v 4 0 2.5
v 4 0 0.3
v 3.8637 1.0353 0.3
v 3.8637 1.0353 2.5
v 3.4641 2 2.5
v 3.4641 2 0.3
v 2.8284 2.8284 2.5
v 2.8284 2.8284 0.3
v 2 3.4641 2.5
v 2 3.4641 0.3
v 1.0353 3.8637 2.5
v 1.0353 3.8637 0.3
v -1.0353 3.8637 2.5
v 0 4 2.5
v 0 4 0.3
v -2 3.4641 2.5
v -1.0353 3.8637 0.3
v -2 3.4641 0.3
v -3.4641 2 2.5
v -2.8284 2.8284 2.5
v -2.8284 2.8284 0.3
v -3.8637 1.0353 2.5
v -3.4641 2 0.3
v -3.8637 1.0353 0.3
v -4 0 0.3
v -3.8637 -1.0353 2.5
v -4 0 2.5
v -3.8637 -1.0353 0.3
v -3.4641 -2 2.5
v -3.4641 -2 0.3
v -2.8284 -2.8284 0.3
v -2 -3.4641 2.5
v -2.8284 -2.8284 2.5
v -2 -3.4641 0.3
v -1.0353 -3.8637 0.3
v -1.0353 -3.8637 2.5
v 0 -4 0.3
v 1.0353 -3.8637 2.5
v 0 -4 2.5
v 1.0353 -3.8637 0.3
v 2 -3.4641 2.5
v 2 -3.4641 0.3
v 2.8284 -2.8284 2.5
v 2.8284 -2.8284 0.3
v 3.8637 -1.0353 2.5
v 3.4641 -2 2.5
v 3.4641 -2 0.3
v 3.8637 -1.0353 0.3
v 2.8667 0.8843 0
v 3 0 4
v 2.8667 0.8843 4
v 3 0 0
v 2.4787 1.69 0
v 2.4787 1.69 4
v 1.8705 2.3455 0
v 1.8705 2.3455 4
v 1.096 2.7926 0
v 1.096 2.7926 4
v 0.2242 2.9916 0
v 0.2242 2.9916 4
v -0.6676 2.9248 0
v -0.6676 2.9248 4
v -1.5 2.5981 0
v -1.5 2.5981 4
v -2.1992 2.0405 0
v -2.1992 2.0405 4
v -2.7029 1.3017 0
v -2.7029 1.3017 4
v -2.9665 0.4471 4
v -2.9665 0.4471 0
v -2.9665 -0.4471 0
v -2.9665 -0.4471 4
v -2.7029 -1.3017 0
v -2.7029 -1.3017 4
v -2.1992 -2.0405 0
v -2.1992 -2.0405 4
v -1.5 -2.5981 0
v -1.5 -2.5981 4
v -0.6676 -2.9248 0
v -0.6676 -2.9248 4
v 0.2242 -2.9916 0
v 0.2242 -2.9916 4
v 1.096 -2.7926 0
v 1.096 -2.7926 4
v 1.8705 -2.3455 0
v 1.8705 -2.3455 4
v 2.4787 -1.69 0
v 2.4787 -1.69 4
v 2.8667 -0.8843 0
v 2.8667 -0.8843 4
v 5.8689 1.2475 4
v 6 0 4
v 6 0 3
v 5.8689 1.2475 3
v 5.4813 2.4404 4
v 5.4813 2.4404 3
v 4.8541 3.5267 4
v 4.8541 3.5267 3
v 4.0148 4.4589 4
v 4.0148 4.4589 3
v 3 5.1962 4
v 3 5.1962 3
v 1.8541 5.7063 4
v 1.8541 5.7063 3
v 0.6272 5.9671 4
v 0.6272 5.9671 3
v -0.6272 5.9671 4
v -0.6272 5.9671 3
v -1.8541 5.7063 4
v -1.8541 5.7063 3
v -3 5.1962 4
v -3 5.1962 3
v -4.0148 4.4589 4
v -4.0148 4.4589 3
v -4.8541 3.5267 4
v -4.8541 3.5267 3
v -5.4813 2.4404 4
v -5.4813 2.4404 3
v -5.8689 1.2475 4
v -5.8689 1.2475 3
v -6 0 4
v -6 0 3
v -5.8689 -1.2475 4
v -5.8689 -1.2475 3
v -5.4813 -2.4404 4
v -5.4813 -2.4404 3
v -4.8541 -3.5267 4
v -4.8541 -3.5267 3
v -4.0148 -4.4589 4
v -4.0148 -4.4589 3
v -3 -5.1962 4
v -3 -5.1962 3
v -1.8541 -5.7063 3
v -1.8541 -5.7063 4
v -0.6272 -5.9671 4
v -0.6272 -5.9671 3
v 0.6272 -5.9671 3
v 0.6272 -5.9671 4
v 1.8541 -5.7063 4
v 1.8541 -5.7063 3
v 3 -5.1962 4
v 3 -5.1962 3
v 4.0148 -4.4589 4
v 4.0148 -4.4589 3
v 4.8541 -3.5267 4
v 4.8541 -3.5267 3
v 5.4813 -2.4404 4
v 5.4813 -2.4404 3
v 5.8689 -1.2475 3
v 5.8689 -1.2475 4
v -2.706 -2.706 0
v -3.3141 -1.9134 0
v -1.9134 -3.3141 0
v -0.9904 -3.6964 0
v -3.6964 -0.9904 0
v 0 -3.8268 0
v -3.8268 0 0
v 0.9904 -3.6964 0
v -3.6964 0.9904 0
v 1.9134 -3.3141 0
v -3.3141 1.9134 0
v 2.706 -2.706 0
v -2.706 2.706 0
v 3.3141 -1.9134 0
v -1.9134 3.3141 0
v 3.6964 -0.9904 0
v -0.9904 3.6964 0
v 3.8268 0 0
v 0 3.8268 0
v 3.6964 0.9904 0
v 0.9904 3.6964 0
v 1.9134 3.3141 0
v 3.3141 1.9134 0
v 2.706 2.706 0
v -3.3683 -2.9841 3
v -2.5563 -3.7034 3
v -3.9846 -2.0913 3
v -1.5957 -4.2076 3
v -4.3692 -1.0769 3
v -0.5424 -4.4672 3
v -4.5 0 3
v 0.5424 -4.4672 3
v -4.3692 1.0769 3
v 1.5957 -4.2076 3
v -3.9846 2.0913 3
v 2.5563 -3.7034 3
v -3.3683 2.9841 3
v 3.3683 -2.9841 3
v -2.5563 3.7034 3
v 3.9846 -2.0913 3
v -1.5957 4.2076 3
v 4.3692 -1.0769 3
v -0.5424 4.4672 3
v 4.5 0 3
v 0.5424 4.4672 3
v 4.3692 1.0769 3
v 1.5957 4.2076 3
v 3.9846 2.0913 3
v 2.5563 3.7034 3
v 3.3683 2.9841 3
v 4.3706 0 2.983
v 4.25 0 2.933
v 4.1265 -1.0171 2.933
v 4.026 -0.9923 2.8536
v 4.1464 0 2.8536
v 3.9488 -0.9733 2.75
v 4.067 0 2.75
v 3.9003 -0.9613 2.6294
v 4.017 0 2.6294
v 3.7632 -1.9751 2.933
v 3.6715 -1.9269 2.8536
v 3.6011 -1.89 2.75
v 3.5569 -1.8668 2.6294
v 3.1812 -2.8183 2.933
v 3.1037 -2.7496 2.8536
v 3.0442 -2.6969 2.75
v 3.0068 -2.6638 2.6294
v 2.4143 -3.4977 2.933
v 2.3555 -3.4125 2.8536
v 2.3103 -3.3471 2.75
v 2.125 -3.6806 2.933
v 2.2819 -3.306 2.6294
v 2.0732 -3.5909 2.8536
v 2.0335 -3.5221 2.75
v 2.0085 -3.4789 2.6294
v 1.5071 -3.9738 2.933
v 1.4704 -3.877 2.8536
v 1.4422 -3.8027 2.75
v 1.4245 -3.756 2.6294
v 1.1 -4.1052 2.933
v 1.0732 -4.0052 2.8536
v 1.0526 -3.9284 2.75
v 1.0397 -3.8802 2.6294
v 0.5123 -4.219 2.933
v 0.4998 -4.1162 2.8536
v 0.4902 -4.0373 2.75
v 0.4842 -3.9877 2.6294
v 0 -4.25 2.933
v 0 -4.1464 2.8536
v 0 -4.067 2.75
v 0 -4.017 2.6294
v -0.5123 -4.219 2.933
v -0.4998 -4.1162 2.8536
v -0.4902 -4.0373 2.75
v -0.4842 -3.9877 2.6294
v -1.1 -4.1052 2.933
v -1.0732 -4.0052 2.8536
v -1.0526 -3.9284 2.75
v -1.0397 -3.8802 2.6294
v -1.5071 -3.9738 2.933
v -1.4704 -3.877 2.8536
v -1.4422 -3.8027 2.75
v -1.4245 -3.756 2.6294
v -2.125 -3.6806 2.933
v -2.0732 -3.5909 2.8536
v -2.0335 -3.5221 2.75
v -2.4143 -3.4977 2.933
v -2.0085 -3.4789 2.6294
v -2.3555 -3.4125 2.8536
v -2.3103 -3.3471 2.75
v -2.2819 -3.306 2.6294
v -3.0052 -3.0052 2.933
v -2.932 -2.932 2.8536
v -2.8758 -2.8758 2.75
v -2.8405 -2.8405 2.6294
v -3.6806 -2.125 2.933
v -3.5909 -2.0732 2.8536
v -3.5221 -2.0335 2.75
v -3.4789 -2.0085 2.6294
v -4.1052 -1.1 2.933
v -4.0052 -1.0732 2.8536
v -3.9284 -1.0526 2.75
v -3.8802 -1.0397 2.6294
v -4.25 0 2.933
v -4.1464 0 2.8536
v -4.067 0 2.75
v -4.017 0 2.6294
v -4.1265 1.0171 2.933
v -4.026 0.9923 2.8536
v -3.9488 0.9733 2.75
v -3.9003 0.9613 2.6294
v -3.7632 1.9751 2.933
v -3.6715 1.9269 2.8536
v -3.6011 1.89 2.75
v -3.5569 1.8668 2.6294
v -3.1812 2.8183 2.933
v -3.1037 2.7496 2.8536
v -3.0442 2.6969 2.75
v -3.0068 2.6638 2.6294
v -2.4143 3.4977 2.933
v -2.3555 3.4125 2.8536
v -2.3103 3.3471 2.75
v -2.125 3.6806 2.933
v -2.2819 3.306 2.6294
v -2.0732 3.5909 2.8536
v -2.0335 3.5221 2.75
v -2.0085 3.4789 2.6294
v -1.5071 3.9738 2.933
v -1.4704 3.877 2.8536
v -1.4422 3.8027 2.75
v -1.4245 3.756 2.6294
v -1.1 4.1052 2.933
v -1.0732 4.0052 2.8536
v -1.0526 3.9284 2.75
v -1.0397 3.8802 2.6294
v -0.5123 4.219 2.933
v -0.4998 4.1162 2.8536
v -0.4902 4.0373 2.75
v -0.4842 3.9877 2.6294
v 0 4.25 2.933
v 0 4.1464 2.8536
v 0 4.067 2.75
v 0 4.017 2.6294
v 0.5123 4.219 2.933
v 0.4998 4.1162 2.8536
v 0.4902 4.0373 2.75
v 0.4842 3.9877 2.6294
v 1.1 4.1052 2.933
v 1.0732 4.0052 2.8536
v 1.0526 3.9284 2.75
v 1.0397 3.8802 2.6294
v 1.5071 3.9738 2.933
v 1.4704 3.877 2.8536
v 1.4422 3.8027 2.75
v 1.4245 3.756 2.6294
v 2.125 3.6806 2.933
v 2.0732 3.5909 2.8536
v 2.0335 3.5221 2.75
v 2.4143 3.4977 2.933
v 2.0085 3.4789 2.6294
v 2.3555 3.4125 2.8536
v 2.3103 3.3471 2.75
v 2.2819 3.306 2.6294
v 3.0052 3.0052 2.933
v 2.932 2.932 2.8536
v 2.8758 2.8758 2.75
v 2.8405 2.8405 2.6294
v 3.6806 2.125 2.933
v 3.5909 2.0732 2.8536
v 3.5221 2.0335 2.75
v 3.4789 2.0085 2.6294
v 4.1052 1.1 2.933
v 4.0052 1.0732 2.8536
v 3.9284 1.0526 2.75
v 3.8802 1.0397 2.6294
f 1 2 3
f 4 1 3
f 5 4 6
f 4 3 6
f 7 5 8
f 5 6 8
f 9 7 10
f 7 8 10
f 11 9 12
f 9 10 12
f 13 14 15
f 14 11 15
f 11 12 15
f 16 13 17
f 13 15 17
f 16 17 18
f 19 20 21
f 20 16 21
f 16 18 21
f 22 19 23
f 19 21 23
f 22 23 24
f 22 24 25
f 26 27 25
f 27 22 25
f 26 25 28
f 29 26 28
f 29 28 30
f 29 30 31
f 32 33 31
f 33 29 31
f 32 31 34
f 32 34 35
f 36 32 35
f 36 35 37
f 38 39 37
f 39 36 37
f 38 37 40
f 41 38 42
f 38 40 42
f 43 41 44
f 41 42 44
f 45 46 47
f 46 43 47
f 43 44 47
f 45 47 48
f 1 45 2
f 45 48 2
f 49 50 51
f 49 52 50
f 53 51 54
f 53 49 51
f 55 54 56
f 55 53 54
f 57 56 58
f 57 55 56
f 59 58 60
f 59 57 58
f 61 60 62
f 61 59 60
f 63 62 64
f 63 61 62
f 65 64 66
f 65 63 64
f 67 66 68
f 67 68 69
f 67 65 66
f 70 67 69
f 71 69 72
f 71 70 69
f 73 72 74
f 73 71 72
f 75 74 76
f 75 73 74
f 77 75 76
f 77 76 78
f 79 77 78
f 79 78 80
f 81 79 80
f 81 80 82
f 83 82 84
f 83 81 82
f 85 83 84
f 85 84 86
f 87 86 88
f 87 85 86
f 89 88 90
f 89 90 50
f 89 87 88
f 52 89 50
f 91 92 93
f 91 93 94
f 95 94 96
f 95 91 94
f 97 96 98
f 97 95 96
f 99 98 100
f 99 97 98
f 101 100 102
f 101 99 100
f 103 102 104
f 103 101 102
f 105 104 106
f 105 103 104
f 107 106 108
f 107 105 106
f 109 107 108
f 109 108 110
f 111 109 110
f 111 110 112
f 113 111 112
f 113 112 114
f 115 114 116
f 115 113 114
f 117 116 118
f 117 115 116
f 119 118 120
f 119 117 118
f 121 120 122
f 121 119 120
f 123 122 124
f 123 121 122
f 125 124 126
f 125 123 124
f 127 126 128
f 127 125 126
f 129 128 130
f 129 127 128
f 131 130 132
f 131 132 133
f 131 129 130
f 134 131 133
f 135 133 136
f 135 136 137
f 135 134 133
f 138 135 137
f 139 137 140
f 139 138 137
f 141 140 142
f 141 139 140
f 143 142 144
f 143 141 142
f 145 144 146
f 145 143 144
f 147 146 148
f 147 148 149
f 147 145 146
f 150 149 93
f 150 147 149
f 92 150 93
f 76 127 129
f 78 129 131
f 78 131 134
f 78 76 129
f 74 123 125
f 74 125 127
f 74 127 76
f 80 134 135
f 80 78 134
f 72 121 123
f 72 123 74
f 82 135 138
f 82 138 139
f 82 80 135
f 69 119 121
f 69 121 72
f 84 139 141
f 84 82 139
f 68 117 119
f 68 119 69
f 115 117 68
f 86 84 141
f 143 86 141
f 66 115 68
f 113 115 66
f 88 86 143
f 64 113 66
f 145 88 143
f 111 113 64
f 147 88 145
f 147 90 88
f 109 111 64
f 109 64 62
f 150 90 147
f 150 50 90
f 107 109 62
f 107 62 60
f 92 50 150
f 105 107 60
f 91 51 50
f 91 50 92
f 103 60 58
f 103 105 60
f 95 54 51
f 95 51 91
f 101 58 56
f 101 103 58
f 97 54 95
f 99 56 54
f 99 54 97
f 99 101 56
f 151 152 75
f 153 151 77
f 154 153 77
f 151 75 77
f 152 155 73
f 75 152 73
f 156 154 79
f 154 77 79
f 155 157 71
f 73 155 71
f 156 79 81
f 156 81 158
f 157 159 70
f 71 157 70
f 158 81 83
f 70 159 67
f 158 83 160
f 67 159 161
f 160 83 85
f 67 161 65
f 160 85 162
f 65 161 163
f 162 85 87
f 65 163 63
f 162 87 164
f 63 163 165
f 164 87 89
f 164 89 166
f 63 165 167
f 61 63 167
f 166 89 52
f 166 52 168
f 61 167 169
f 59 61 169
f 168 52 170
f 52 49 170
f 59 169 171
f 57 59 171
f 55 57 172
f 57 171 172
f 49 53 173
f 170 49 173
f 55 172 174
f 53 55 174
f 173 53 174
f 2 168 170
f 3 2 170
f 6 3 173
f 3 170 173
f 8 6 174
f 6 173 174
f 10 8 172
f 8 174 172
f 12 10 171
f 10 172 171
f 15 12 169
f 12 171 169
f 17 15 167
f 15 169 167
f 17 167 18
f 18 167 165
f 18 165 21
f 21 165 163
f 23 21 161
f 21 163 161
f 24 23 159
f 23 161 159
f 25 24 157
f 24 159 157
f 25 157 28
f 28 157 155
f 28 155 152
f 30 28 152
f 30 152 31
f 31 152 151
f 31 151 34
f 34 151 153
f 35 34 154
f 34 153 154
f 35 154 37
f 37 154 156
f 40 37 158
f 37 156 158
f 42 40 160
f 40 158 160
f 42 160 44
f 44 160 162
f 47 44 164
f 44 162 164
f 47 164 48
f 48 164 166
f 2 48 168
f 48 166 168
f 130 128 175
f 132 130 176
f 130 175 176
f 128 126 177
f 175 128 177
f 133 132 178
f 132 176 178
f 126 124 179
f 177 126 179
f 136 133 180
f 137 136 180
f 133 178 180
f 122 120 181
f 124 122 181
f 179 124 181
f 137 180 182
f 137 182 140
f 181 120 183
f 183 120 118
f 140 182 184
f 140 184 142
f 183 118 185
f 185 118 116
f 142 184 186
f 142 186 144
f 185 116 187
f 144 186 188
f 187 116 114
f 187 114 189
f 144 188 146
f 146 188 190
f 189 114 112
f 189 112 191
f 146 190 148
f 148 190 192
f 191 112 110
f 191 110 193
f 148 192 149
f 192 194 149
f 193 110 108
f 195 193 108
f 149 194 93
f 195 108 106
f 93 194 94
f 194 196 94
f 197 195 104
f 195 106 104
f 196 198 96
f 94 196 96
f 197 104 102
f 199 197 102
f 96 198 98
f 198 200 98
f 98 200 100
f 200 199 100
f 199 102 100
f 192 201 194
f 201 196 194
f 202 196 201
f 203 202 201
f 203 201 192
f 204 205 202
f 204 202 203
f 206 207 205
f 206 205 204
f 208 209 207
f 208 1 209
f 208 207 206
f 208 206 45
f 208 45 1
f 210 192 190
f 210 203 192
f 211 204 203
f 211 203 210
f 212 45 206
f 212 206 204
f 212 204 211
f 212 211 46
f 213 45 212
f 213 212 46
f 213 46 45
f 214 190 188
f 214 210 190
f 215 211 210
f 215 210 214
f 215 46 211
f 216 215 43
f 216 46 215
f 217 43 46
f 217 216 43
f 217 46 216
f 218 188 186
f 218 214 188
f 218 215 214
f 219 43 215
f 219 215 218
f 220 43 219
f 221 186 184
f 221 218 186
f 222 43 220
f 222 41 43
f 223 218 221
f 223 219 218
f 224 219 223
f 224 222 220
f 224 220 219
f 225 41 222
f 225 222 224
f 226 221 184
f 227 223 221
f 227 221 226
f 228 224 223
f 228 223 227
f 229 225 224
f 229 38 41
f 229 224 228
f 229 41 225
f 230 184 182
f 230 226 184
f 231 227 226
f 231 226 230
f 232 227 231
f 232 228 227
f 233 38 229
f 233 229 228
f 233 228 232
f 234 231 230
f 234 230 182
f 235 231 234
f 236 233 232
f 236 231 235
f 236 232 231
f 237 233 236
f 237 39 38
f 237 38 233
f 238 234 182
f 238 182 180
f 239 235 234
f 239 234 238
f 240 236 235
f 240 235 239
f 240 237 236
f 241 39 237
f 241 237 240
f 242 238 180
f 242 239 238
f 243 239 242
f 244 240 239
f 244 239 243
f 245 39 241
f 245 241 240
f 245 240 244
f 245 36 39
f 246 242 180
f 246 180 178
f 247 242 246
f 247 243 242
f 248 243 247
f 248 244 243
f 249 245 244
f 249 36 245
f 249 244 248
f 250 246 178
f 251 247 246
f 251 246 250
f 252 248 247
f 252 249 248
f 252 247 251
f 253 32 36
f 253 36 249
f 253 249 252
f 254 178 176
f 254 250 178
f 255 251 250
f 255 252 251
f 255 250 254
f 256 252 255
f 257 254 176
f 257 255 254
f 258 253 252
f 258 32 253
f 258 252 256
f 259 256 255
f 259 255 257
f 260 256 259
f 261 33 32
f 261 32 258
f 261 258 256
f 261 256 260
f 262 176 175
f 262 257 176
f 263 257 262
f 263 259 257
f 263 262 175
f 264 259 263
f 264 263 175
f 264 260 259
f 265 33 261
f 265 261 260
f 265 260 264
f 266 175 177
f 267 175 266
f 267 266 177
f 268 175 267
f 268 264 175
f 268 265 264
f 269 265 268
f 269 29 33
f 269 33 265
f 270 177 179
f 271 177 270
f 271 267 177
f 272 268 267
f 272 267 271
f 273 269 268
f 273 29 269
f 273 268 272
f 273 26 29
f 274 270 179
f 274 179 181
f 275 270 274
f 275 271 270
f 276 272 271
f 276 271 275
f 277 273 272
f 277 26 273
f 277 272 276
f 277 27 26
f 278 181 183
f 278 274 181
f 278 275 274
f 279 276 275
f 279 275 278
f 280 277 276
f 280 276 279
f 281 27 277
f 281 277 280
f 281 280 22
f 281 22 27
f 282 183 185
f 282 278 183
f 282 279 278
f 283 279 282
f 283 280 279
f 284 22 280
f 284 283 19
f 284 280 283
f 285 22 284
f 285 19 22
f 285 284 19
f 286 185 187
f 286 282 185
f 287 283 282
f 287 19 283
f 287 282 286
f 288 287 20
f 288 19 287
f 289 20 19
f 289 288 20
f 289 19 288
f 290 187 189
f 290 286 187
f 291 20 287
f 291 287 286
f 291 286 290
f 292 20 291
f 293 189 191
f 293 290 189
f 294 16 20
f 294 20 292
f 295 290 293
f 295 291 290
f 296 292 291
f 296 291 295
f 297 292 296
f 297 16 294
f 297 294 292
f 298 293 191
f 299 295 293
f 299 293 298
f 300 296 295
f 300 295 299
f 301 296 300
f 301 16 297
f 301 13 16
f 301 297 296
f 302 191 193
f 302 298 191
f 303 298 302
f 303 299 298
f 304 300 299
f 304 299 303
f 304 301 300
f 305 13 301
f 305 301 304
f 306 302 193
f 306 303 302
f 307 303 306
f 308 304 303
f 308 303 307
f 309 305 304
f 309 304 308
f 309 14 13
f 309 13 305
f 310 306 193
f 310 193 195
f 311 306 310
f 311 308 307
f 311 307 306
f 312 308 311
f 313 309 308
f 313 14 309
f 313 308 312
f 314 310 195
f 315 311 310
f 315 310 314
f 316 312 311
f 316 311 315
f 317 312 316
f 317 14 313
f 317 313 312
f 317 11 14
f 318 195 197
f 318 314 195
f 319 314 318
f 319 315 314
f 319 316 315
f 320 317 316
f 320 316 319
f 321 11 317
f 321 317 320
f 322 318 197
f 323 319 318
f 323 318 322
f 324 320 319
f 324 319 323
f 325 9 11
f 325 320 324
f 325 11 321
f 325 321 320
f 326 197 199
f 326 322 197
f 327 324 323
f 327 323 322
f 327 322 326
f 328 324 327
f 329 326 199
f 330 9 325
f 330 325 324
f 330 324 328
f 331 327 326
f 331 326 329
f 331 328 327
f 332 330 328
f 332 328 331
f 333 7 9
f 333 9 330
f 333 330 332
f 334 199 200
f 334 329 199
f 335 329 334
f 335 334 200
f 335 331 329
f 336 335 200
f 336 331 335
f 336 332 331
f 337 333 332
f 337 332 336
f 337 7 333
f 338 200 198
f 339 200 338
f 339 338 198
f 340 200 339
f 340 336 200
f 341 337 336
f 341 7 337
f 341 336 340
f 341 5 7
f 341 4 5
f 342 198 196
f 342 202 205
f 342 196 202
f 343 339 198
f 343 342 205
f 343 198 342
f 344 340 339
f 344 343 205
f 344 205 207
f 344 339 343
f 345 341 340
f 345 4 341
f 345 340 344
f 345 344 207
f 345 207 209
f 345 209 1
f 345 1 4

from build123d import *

# Parameters (mm, degrees)
SKETCH1_R           = 4
SKETCH1_R_2         = 3
BOSS_EXTRUDE1_DEPTH = 4
SKETCH2_R           = 6
SKETCH2_R_2         = 3
BOSS_EXTRUDE2_DEPTH = 1
FILLET1_R           = 0.5
CHAMFER1_SIZE       = 0.3
CHAMFER1_SIZE2      = 0.173205081


with BuildPart() as part:
    # Sketch1 → Boss-Extrude1 (new body)
    with BuildSketch(Plane.XY):
        Circle(SKETCH1_R)
        Circle(SKETCH1_R_2, mode=Mode.SUBTRACT)
    extrude(amount=BOSS_EXTRUDE1_DEPTH)

    # Sketch2 → Boss-Extrude2 (add)
    with BuildSketch(Plane.XY.offset(4)):
        Circle(SKETCH2_R)
        Circle(SKETCH2_R_2, mode=Mode.SUBTRACT)
    extrude(amount=-BOSS_EXTRUDE2_DEPTH)

    # Fillet1
    fillet1_edges = [part.edges().sort_by_distance(p)[0] for p in [
        (-4, 0, 3),
    ]]
    fillet(fillet1_edges, radius=FILLET1_R)

    # Chamfer1
    chamfer1_edges = [part.edges().sort_by_distance(p)[0] for p in [
        (-4, 0, 0),
    ]]
    chamfer1_side = [part.faces().sort_by_distance(p)[0] for p in [
        (-4, 0, 1.25),
    ]]
    chamfer(chamfer1_edges, length=CHAMFER1_SIZE, length2=CHAMFER1_SIZE2, reference=chamfer1_side[0])


solid = part.part
